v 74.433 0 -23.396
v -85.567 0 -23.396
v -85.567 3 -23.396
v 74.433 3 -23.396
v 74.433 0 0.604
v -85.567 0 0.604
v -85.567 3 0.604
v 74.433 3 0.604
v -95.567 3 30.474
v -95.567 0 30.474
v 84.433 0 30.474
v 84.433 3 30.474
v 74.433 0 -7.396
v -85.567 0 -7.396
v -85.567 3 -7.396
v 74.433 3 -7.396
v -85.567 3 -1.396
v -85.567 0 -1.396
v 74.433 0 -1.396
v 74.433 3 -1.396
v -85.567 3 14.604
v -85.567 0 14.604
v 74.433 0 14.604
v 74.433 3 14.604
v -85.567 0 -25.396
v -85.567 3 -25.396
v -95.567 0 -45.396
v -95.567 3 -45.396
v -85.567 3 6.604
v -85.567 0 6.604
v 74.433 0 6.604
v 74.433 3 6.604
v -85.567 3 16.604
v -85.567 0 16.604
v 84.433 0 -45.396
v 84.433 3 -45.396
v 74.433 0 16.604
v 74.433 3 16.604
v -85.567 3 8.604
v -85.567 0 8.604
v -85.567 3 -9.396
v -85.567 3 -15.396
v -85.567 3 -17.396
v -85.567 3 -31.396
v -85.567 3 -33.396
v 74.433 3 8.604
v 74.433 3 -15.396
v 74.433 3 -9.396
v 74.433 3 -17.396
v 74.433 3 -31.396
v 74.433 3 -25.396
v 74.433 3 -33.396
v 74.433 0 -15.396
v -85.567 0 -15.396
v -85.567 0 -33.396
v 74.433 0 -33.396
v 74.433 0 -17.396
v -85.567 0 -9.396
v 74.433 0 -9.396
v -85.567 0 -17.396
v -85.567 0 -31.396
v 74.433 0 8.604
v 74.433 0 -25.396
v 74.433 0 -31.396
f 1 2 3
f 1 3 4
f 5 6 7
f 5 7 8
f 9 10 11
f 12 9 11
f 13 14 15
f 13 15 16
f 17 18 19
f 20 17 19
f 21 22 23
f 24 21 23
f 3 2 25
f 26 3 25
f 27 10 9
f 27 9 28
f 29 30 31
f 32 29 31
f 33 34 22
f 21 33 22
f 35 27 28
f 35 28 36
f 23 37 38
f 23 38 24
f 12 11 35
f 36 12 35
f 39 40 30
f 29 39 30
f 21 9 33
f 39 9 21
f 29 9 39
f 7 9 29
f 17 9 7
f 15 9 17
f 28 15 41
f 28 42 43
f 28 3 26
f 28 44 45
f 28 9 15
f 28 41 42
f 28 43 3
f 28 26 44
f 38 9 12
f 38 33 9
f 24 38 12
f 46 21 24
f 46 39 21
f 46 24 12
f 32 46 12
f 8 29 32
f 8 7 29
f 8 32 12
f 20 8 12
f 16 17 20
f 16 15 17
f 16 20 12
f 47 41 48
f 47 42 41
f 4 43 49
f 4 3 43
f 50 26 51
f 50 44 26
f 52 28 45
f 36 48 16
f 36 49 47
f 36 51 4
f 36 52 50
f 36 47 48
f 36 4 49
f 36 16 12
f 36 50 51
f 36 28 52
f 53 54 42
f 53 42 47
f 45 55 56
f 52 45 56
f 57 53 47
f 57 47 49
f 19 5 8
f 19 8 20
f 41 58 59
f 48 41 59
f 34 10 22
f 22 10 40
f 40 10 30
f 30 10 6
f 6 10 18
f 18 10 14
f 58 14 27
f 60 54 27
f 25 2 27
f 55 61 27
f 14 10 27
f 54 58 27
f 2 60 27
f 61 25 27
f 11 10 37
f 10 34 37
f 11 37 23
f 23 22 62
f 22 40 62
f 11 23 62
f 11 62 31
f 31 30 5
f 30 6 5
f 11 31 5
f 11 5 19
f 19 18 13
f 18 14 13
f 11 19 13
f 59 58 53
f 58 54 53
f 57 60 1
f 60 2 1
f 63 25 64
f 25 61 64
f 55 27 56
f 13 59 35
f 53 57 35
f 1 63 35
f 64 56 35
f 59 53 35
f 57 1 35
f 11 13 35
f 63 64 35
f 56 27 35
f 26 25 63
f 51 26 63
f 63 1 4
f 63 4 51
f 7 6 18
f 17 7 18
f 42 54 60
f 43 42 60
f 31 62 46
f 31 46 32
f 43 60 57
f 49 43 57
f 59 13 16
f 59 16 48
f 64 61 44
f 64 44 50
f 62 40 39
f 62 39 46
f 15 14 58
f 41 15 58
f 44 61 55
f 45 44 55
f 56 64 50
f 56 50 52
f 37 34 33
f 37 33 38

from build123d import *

# Parameters (mm, degrees)
SKETCH1_W           = 180
SKETCH1_H           = 75.87
SKETCH1_W_2         = 160
SKETCH1_H_2         = 2
BOSS_EXTRUDE1_DEPTH = 3


with BuildPart() as part:
    # Sketch1 → Boss-Extrude1 (new body)
    with BuildSketch(Plane(origin=(0, 0, 0), x_dir=(1, 0, 0), z_dir=(0, 1, 0))):
        with Locations((-5.566969943, 7.461475771)):
            Rectangle(SKETCH1_W, SKETCH1_H)
        with Locations((-5.566969943, 24.396475771)):
            Rectangle(SKETCH1_W_2, SKETCH1_H_2, mode=Mode.SUBTRACT)
        with Locations((-5.566969943, 32.396475771)):
            Rectangle(SKETCH1_W_2, SKETCH1_H_2, mode=Mode.SUBTRACT)
        with Locations((-5.566969943, 16.396475771)):
            Rectangle(SKETCH1_W_2, SKETCH1_H_2, mode=Mode.SUBTRACT)
        with Locations((-5.566969943, 8.396475771)):
            Rectangle(SKETCH1_W_2, SKETCH1_H_2, mode=Mode.SUBTRACT)
        with Locations((-5.566969943, 0.396475771)):
            Rectangle(SKETCH1_W_2, SKETCH1_H_2, mode=Mode.SUBTRACT)
        with Locations((-5.566969943, -7.603524229)):
            Rectangle(SKETCH1_W_2, SKETCH1_H_2, mode=Mode.SUBTRACT)
        with Locations((-5.566969943, -15.603524229)):
            Rectangle(SKETCH1_W_2, SKETCH1_H_2, mode=Mode.SUBTRACT)
    extrude(amount=BOSS_EXTRUDE1_DEPTH)


solid = part.part
